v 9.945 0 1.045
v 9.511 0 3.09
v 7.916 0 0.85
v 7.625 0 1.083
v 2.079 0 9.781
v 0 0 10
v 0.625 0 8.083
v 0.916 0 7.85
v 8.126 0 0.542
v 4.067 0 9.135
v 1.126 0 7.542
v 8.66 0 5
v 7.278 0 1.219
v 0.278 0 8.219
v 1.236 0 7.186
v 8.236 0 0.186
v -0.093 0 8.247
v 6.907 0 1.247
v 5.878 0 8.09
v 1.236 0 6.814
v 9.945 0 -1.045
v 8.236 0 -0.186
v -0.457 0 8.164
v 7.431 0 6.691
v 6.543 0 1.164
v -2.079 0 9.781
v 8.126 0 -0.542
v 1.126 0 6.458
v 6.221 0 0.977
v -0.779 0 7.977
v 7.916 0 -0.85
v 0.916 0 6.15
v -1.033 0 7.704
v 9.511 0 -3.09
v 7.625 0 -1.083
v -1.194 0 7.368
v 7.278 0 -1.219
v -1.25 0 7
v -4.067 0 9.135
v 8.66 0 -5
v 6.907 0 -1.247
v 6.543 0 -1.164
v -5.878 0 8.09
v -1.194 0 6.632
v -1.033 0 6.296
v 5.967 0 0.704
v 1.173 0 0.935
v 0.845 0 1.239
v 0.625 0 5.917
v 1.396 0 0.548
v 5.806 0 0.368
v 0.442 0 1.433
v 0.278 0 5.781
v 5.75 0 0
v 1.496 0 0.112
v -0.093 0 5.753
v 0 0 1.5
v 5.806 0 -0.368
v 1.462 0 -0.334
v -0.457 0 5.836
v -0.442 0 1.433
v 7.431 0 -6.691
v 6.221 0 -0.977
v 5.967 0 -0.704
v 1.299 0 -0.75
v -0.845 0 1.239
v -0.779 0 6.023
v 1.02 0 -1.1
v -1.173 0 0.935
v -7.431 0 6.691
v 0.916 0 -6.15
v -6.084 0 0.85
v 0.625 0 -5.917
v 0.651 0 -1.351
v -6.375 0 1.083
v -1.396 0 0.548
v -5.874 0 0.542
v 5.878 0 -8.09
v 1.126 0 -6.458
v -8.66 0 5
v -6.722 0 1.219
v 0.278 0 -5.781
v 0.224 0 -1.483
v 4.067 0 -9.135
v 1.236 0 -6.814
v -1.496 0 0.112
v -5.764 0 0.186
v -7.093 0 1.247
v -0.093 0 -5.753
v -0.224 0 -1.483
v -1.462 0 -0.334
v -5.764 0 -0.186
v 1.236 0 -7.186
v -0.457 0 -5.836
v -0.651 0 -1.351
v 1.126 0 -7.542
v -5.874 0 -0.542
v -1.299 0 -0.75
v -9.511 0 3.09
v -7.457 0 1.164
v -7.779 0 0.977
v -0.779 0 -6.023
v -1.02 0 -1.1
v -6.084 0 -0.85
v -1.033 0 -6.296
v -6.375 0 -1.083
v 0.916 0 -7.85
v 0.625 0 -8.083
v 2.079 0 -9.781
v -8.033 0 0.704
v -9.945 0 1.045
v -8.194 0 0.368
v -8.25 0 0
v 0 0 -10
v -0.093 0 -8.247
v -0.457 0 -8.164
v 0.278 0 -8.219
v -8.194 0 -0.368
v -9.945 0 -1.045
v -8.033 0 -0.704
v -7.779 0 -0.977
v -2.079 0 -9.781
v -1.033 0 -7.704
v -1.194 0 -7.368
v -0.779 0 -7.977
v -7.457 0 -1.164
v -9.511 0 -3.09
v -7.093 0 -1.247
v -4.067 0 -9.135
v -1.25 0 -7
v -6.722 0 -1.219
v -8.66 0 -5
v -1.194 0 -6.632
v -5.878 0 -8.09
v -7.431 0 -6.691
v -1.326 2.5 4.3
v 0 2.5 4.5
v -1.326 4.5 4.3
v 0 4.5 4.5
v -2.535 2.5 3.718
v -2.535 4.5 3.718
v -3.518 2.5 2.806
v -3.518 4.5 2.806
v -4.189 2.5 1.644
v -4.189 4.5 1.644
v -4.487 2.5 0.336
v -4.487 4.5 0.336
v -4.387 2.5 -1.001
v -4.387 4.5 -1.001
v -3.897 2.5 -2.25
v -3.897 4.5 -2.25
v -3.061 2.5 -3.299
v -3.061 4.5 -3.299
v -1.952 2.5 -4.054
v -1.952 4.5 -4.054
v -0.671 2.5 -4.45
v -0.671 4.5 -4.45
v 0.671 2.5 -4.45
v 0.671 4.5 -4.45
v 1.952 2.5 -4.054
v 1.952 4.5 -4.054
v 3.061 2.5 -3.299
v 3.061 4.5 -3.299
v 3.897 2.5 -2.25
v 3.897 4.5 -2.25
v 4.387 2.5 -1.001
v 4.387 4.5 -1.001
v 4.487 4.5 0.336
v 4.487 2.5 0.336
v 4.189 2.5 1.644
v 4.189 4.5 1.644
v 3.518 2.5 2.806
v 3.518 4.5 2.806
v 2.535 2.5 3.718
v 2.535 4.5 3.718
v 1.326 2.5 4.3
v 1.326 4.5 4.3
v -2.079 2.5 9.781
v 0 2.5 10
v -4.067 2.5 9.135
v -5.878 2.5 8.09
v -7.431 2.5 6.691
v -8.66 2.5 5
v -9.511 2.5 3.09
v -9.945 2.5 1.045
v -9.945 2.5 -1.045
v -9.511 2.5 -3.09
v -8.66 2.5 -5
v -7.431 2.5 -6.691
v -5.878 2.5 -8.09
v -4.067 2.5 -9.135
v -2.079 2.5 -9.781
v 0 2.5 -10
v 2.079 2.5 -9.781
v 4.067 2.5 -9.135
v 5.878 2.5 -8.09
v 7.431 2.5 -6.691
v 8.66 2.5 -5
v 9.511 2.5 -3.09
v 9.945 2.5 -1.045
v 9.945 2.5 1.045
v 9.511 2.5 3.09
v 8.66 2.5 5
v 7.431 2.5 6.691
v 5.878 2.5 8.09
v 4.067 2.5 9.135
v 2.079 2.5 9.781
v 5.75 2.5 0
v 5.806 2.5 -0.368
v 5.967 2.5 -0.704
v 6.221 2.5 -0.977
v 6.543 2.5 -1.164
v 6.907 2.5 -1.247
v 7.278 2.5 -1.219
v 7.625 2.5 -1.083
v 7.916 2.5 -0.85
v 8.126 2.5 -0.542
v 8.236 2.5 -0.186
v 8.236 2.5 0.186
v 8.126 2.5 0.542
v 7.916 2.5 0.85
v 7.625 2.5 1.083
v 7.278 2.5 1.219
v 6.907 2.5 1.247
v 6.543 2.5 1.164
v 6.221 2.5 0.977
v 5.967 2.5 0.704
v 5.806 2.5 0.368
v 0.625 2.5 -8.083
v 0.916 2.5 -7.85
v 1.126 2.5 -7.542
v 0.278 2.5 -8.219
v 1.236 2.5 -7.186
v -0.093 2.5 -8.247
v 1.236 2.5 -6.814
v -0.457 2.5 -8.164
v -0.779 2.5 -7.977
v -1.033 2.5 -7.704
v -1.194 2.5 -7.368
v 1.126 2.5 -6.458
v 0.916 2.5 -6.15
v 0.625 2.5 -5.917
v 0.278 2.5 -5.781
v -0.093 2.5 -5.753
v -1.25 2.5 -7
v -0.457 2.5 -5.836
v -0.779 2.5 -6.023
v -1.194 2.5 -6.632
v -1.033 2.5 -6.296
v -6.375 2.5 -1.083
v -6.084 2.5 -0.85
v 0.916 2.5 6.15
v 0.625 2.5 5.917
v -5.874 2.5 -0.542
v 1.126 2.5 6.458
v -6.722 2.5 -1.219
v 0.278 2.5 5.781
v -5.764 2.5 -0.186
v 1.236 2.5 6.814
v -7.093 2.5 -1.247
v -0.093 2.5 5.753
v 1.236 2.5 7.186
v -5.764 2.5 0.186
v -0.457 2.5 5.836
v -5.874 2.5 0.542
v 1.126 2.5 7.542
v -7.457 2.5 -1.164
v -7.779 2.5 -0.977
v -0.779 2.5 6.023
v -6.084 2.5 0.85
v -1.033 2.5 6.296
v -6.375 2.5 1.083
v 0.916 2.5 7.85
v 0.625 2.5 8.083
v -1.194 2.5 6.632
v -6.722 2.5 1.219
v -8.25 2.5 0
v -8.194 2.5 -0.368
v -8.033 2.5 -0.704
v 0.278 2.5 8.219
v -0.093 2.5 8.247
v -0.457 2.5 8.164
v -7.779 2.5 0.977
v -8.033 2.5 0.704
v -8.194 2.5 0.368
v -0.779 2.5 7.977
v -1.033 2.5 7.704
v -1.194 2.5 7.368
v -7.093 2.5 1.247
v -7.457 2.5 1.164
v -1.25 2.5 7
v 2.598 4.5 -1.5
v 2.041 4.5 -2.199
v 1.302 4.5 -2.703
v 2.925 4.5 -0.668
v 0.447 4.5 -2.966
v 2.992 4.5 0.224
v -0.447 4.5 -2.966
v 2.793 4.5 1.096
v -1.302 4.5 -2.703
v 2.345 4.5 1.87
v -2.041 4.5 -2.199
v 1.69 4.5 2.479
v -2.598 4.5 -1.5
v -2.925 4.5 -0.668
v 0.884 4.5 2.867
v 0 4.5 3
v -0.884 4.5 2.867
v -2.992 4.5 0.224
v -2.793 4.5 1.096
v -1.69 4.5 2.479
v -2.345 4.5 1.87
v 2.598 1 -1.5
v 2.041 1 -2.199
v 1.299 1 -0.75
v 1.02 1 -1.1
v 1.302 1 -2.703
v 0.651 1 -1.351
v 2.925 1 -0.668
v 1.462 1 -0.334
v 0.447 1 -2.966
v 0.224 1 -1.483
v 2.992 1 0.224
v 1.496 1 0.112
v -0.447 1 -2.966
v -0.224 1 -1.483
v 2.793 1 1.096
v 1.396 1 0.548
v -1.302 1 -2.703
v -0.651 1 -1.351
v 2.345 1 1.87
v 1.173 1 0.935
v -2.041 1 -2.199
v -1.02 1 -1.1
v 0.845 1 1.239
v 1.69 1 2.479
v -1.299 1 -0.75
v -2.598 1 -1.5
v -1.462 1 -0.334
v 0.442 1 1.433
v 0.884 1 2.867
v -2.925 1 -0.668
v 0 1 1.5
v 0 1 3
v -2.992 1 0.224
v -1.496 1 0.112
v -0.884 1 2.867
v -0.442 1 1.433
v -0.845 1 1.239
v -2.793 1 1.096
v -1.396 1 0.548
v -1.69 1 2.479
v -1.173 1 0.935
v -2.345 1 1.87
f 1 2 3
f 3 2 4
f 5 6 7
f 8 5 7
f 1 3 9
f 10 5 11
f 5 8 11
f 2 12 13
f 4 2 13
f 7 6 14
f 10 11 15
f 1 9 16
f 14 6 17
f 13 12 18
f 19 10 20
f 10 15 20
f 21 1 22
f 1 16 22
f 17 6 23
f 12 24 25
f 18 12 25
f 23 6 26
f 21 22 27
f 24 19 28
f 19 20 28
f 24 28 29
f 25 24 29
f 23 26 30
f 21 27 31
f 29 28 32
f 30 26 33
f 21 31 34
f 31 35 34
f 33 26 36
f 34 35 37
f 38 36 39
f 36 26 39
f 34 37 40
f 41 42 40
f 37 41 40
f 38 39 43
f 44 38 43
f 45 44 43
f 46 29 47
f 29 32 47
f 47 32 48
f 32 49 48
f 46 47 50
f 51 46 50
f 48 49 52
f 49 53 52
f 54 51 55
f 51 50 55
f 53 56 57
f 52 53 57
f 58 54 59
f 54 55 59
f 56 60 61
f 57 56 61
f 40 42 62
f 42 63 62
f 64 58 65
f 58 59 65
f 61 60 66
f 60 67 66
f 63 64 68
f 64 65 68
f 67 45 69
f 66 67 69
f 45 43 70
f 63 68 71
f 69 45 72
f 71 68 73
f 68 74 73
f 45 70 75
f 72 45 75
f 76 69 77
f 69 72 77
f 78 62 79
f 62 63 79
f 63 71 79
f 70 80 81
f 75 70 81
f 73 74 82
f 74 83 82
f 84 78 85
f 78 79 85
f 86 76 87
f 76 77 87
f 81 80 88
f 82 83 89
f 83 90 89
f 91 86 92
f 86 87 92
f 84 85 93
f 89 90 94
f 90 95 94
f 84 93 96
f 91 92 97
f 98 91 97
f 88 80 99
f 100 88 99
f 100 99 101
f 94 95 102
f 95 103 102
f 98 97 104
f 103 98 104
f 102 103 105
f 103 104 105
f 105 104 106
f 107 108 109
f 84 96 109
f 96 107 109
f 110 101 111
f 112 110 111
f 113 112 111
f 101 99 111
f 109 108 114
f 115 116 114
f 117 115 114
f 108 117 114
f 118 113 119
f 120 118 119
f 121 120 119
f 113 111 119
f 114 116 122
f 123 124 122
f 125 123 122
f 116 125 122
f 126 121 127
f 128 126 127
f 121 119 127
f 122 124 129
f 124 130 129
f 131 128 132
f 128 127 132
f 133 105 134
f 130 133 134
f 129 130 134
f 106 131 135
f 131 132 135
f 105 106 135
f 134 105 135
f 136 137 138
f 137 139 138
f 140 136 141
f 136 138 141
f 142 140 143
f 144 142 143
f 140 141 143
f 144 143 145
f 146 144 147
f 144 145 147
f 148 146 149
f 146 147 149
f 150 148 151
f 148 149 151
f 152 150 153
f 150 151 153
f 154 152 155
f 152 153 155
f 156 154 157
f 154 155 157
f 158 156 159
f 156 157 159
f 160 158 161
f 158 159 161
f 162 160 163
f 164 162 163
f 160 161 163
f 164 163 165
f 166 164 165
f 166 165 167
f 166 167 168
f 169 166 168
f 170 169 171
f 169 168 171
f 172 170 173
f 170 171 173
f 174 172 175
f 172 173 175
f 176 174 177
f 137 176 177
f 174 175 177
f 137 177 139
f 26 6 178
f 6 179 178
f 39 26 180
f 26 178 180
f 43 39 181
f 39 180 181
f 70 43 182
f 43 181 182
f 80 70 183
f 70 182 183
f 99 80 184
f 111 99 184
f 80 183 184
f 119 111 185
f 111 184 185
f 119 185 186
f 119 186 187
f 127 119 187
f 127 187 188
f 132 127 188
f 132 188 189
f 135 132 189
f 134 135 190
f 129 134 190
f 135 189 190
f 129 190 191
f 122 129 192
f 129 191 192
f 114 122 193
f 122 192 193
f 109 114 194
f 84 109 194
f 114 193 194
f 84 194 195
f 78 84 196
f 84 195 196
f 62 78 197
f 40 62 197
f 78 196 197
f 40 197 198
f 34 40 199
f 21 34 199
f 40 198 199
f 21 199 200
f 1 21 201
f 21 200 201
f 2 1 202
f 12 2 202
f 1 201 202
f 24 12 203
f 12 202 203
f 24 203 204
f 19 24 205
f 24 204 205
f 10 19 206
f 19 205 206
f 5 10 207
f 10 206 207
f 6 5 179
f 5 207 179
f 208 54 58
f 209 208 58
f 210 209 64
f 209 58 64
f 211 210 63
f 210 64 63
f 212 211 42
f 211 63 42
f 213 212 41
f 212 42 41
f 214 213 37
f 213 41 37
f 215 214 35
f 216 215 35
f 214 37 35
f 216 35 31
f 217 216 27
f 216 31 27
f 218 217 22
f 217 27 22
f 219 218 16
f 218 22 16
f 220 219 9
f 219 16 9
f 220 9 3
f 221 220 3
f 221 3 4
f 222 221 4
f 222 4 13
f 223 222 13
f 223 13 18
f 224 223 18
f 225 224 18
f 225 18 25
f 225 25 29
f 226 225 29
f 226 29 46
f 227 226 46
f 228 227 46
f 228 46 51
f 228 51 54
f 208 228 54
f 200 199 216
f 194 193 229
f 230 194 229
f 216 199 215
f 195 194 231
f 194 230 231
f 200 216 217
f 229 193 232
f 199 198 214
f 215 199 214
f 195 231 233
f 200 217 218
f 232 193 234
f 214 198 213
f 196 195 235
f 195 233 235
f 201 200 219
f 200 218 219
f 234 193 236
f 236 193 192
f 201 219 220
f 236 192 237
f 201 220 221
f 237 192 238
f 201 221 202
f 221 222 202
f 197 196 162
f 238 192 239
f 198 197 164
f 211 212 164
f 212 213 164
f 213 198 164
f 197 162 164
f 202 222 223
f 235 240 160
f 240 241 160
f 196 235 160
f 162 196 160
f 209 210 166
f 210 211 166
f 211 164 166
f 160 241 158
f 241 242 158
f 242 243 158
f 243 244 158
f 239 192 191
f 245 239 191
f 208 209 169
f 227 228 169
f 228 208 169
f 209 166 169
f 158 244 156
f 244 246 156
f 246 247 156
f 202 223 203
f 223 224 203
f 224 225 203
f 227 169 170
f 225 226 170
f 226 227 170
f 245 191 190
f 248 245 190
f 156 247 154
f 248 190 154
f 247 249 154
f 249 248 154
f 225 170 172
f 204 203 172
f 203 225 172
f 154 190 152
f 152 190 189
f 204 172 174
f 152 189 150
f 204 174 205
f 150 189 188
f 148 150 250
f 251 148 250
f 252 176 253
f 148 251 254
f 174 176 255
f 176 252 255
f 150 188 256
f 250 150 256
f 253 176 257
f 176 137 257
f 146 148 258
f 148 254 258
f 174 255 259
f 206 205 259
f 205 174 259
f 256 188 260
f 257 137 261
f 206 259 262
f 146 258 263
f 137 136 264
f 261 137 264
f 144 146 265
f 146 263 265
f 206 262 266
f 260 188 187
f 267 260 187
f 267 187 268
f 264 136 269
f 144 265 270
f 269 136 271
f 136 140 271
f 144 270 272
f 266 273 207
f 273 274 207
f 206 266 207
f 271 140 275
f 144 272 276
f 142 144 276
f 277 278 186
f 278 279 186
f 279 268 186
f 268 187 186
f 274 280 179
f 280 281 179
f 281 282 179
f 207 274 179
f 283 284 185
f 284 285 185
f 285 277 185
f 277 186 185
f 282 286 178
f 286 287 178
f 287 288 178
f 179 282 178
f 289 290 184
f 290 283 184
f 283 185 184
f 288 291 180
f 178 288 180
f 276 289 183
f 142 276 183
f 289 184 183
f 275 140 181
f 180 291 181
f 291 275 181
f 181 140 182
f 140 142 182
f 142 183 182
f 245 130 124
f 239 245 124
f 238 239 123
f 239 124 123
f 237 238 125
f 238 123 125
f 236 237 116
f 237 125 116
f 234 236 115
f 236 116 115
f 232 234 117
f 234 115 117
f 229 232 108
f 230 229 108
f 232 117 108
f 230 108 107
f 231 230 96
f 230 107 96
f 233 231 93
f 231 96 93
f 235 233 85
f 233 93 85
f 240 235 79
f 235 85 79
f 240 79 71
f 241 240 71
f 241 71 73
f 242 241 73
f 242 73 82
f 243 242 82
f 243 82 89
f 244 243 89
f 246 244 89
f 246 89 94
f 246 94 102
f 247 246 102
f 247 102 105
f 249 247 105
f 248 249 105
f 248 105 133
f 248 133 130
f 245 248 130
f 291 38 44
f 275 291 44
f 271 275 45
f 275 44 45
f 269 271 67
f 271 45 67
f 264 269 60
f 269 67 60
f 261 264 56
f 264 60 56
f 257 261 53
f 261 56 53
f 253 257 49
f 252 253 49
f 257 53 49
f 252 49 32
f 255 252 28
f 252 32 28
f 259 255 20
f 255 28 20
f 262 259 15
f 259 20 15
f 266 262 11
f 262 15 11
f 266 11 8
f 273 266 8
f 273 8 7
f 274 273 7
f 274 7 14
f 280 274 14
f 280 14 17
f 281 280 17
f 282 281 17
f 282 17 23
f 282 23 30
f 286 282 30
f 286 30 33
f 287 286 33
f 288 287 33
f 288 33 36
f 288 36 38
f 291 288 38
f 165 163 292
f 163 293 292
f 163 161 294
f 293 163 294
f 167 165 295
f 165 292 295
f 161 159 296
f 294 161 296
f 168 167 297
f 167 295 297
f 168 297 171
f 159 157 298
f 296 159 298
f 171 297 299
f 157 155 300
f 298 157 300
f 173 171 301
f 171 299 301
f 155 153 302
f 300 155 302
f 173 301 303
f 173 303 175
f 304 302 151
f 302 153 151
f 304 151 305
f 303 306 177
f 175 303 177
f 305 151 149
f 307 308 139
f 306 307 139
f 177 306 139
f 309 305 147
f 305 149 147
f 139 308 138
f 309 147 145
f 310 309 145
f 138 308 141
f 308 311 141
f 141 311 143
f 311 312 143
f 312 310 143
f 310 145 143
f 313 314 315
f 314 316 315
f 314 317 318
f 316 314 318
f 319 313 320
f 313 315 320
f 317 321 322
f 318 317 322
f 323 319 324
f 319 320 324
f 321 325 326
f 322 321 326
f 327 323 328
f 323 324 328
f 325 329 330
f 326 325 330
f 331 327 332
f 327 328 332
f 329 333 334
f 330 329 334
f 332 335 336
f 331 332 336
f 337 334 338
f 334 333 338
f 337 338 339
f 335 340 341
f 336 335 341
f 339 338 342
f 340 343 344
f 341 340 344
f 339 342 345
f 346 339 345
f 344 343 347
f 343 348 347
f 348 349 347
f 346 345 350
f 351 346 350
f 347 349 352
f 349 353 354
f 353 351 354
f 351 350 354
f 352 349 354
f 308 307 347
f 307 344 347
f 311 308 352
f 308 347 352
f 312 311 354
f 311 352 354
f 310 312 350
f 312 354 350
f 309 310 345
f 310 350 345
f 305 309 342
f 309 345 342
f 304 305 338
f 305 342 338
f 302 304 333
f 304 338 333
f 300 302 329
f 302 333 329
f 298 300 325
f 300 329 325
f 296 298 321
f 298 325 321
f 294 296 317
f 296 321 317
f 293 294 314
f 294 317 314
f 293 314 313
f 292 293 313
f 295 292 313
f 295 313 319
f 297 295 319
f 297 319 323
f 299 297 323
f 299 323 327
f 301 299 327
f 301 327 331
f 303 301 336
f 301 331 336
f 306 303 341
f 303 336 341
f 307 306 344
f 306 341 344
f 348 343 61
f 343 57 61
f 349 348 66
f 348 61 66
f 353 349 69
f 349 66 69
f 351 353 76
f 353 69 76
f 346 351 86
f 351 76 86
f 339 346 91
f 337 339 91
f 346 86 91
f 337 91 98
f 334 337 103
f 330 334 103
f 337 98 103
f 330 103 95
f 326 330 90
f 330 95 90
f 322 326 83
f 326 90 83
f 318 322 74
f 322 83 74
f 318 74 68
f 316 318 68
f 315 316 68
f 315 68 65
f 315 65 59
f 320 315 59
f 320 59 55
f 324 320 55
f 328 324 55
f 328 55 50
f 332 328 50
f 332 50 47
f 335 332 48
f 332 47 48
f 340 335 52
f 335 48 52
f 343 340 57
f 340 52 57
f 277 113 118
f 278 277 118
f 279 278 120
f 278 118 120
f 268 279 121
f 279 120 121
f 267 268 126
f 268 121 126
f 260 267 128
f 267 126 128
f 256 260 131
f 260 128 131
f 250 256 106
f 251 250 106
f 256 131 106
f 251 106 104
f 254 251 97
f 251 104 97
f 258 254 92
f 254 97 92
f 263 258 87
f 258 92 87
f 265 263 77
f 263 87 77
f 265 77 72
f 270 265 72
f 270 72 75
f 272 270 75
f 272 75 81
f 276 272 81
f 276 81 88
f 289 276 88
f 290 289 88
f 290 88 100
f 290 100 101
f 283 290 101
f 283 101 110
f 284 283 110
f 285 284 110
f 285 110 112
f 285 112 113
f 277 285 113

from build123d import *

# Parameters (mm, degrees)
M3_TAPPED_HOLE1_D = 2.5


with BuildPart() as part:
    # Sketch1 → Revolve1 (revolve)
    with BuildSketch(Plane(origin=(0, 0, 0), x_dir=(0, 0, -1), z_dir=(1, 0, 0)), mode=Mode.PRIVATE) as revolve1_sk:
        Polygon((3, 4.5), (3, 1), (1.5, 1), (1.5, 0), (10, 0), (10, 2.5), (4.5, 2.5), (4.5, 4.5), align=None)
    revolve(revolve1_sk.sketch.rotate(Axis((0, 12.525252525, 0), (0, -1, 0)), 180), axis=Axis((0, 12.525252525, 0), (0, -1, 0)))

    # M3 Tapped Hole1 (through all)
    with Locations(Plane(origin=(0, 2.5, 0), x_dir=(1, 0, 0), z_dir=(0, 1, 0))):
        with Locations((0, 7), (7, 0), (0, -7), (-7, 0)):
            Hole(M3_TAPPED_HOLE1_D / 2)


solid = part.part
